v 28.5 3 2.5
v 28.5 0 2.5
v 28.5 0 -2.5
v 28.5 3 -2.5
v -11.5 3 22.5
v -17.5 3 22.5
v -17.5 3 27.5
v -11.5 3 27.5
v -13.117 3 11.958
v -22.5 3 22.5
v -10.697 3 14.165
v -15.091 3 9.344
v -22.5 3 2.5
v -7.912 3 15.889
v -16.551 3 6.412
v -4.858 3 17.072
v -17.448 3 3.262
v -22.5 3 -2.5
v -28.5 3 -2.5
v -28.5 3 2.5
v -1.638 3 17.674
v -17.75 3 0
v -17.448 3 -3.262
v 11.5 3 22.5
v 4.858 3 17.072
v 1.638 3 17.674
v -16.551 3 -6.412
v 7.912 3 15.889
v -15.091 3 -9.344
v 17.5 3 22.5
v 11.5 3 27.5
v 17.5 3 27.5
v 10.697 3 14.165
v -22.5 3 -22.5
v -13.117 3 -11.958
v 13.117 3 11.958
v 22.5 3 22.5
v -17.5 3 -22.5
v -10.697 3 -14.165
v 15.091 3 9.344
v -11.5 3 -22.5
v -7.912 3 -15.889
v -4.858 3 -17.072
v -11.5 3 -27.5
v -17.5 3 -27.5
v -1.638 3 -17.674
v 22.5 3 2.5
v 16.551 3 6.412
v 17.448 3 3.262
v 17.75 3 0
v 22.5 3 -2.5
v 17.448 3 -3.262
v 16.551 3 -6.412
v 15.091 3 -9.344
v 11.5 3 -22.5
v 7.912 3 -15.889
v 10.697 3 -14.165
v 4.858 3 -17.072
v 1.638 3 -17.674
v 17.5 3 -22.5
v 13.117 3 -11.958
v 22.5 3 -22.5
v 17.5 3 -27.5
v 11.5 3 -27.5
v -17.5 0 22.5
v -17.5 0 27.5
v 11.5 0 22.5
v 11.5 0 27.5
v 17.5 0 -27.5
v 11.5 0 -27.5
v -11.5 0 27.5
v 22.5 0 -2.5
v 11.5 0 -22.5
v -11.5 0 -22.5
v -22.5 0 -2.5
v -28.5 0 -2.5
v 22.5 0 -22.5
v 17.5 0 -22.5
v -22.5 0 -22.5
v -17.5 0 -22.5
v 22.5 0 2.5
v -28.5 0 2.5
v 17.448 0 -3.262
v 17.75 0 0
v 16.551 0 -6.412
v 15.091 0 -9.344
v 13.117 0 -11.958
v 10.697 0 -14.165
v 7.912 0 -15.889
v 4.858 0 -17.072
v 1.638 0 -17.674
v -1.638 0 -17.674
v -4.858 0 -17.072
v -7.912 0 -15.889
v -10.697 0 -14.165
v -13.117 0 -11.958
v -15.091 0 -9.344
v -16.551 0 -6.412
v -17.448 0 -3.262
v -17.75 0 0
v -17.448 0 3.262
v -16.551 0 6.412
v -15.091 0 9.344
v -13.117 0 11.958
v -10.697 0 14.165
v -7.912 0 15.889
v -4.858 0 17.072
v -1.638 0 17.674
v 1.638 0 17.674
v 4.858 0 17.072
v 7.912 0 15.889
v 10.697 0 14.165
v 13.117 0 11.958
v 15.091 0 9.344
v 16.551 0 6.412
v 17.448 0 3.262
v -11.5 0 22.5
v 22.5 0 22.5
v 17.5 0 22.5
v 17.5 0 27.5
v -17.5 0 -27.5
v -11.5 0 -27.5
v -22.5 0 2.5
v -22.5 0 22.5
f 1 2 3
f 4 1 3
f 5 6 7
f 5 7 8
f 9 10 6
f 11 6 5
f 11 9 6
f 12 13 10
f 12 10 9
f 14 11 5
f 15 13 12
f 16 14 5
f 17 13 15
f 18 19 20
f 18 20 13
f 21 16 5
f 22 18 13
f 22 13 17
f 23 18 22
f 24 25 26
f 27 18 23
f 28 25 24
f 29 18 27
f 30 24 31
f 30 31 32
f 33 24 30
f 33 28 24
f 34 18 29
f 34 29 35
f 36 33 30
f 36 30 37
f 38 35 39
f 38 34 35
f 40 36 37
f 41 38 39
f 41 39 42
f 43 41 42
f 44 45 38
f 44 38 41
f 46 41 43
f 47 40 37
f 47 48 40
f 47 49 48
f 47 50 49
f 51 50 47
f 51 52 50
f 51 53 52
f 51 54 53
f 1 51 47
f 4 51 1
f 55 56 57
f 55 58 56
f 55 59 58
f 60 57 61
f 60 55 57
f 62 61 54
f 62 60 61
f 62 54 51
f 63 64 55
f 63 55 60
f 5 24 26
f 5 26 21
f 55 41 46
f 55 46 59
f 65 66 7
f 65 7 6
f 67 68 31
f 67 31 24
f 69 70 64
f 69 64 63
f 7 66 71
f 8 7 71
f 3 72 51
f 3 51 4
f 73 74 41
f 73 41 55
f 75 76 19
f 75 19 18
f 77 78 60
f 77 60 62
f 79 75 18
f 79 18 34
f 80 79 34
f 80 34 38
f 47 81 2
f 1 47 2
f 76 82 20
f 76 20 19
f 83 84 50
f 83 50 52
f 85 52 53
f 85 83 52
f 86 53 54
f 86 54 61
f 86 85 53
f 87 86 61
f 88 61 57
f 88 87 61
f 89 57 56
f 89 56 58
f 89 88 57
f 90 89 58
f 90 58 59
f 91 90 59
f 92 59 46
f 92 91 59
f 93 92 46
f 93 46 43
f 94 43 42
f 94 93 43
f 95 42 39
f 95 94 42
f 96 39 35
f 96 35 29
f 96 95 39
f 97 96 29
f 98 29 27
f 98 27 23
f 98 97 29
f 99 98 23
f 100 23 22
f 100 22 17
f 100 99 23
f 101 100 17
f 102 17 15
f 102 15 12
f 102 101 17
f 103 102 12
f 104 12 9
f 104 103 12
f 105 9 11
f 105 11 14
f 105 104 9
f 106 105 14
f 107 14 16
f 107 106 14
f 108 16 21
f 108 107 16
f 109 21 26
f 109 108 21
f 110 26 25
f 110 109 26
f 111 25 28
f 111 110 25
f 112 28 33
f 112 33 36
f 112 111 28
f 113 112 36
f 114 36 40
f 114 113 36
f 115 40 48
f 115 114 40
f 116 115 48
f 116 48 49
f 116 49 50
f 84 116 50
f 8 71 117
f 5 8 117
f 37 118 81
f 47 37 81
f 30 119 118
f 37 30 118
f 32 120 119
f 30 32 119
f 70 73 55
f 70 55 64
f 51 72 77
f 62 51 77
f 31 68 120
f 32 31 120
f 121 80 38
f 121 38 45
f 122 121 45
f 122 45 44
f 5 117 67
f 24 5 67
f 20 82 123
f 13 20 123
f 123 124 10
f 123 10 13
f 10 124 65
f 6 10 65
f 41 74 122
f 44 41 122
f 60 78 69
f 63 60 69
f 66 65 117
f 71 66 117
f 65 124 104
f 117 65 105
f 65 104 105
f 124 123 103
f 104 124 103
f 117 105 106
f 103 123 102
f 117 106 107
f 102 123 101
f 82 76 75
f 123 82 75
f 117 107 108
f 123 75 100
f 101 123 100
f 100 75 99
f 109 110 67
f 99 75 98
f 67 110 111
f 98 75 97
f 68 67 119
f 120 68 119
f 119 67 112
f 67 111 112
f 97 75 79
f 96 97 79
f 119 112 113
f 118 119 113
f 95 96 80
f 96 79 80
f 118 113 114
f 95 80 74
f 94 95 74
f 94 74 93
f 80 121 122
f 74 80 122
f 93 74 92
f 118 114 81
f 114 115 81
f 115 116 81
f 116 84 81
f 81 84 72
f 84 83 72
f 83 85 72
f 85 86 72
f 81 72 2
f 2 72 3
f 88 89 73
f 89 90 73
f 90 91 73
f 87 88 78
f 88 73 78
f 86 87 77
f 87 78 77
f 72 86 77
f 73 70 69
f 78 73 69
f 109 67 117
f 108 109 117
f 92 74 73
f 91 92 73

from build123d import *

# Parameters (mm, degrees)
CROQUIS1_R              = 17.75
SALIENTE_EXTRUIR1_DEPTH = 3
CROQUIS1_3_W            = 6
CROQUIS1_3_H            = 5
SALIENTE_EXTRUIR2_DEPTH = 3


with BuildPart() as part:
    # Croquis1 → Saliente-Extruir1 (new body)
    with BuildSketch(Plane(origin=(0, 0, 0), x_dir=(1, 0, 0), z_dir=(0, 1, 0))):
        Polygon((-17.5, 22.5), (-22.5, 22.5), (-22.5, -22.5), (-17.5, -22.5), (-17.5, -27.5), (-11.5, -27.5), (-11.5, -22.5), (11.5, -22.5), (11.5, -27.5), (17.5, -27.5), (17.5, -22.5), (22.5, -22.5), (22.5, 22.5), (17.5, 22.5), (17.5, 27.5), (11.5, 27.5), (11.5, 22.5), (-11.5, 22.5), (-11.5, 27.5), (-17.5, 27.5), align=None)
        Circle(CROQUIS1_R, mode=Mode.SUBTRACT)
    extrude(amount=SALIENTE_EXTRUIR1_DEPTH)

    # Croquis1<3> → Saliente-Extruir2 (add)
    with BuildSketch(Plane(origin=(0, 0, 0), x_dir=(1, 0, 0), z_dir=(0, 1, 0))):
        with Locations((-25.5, 0)):
            Rectangle(CROQUIS1_3_W, CROQUIS1_3_H)
        with Locations((25.5, 0)):
            Rectangle(CROQUIS1_3_W, CROQUIS1_3_H)
    extrude(amount=SALIENTE_EXTRUIR2_DEPTH)


solid = part.part
